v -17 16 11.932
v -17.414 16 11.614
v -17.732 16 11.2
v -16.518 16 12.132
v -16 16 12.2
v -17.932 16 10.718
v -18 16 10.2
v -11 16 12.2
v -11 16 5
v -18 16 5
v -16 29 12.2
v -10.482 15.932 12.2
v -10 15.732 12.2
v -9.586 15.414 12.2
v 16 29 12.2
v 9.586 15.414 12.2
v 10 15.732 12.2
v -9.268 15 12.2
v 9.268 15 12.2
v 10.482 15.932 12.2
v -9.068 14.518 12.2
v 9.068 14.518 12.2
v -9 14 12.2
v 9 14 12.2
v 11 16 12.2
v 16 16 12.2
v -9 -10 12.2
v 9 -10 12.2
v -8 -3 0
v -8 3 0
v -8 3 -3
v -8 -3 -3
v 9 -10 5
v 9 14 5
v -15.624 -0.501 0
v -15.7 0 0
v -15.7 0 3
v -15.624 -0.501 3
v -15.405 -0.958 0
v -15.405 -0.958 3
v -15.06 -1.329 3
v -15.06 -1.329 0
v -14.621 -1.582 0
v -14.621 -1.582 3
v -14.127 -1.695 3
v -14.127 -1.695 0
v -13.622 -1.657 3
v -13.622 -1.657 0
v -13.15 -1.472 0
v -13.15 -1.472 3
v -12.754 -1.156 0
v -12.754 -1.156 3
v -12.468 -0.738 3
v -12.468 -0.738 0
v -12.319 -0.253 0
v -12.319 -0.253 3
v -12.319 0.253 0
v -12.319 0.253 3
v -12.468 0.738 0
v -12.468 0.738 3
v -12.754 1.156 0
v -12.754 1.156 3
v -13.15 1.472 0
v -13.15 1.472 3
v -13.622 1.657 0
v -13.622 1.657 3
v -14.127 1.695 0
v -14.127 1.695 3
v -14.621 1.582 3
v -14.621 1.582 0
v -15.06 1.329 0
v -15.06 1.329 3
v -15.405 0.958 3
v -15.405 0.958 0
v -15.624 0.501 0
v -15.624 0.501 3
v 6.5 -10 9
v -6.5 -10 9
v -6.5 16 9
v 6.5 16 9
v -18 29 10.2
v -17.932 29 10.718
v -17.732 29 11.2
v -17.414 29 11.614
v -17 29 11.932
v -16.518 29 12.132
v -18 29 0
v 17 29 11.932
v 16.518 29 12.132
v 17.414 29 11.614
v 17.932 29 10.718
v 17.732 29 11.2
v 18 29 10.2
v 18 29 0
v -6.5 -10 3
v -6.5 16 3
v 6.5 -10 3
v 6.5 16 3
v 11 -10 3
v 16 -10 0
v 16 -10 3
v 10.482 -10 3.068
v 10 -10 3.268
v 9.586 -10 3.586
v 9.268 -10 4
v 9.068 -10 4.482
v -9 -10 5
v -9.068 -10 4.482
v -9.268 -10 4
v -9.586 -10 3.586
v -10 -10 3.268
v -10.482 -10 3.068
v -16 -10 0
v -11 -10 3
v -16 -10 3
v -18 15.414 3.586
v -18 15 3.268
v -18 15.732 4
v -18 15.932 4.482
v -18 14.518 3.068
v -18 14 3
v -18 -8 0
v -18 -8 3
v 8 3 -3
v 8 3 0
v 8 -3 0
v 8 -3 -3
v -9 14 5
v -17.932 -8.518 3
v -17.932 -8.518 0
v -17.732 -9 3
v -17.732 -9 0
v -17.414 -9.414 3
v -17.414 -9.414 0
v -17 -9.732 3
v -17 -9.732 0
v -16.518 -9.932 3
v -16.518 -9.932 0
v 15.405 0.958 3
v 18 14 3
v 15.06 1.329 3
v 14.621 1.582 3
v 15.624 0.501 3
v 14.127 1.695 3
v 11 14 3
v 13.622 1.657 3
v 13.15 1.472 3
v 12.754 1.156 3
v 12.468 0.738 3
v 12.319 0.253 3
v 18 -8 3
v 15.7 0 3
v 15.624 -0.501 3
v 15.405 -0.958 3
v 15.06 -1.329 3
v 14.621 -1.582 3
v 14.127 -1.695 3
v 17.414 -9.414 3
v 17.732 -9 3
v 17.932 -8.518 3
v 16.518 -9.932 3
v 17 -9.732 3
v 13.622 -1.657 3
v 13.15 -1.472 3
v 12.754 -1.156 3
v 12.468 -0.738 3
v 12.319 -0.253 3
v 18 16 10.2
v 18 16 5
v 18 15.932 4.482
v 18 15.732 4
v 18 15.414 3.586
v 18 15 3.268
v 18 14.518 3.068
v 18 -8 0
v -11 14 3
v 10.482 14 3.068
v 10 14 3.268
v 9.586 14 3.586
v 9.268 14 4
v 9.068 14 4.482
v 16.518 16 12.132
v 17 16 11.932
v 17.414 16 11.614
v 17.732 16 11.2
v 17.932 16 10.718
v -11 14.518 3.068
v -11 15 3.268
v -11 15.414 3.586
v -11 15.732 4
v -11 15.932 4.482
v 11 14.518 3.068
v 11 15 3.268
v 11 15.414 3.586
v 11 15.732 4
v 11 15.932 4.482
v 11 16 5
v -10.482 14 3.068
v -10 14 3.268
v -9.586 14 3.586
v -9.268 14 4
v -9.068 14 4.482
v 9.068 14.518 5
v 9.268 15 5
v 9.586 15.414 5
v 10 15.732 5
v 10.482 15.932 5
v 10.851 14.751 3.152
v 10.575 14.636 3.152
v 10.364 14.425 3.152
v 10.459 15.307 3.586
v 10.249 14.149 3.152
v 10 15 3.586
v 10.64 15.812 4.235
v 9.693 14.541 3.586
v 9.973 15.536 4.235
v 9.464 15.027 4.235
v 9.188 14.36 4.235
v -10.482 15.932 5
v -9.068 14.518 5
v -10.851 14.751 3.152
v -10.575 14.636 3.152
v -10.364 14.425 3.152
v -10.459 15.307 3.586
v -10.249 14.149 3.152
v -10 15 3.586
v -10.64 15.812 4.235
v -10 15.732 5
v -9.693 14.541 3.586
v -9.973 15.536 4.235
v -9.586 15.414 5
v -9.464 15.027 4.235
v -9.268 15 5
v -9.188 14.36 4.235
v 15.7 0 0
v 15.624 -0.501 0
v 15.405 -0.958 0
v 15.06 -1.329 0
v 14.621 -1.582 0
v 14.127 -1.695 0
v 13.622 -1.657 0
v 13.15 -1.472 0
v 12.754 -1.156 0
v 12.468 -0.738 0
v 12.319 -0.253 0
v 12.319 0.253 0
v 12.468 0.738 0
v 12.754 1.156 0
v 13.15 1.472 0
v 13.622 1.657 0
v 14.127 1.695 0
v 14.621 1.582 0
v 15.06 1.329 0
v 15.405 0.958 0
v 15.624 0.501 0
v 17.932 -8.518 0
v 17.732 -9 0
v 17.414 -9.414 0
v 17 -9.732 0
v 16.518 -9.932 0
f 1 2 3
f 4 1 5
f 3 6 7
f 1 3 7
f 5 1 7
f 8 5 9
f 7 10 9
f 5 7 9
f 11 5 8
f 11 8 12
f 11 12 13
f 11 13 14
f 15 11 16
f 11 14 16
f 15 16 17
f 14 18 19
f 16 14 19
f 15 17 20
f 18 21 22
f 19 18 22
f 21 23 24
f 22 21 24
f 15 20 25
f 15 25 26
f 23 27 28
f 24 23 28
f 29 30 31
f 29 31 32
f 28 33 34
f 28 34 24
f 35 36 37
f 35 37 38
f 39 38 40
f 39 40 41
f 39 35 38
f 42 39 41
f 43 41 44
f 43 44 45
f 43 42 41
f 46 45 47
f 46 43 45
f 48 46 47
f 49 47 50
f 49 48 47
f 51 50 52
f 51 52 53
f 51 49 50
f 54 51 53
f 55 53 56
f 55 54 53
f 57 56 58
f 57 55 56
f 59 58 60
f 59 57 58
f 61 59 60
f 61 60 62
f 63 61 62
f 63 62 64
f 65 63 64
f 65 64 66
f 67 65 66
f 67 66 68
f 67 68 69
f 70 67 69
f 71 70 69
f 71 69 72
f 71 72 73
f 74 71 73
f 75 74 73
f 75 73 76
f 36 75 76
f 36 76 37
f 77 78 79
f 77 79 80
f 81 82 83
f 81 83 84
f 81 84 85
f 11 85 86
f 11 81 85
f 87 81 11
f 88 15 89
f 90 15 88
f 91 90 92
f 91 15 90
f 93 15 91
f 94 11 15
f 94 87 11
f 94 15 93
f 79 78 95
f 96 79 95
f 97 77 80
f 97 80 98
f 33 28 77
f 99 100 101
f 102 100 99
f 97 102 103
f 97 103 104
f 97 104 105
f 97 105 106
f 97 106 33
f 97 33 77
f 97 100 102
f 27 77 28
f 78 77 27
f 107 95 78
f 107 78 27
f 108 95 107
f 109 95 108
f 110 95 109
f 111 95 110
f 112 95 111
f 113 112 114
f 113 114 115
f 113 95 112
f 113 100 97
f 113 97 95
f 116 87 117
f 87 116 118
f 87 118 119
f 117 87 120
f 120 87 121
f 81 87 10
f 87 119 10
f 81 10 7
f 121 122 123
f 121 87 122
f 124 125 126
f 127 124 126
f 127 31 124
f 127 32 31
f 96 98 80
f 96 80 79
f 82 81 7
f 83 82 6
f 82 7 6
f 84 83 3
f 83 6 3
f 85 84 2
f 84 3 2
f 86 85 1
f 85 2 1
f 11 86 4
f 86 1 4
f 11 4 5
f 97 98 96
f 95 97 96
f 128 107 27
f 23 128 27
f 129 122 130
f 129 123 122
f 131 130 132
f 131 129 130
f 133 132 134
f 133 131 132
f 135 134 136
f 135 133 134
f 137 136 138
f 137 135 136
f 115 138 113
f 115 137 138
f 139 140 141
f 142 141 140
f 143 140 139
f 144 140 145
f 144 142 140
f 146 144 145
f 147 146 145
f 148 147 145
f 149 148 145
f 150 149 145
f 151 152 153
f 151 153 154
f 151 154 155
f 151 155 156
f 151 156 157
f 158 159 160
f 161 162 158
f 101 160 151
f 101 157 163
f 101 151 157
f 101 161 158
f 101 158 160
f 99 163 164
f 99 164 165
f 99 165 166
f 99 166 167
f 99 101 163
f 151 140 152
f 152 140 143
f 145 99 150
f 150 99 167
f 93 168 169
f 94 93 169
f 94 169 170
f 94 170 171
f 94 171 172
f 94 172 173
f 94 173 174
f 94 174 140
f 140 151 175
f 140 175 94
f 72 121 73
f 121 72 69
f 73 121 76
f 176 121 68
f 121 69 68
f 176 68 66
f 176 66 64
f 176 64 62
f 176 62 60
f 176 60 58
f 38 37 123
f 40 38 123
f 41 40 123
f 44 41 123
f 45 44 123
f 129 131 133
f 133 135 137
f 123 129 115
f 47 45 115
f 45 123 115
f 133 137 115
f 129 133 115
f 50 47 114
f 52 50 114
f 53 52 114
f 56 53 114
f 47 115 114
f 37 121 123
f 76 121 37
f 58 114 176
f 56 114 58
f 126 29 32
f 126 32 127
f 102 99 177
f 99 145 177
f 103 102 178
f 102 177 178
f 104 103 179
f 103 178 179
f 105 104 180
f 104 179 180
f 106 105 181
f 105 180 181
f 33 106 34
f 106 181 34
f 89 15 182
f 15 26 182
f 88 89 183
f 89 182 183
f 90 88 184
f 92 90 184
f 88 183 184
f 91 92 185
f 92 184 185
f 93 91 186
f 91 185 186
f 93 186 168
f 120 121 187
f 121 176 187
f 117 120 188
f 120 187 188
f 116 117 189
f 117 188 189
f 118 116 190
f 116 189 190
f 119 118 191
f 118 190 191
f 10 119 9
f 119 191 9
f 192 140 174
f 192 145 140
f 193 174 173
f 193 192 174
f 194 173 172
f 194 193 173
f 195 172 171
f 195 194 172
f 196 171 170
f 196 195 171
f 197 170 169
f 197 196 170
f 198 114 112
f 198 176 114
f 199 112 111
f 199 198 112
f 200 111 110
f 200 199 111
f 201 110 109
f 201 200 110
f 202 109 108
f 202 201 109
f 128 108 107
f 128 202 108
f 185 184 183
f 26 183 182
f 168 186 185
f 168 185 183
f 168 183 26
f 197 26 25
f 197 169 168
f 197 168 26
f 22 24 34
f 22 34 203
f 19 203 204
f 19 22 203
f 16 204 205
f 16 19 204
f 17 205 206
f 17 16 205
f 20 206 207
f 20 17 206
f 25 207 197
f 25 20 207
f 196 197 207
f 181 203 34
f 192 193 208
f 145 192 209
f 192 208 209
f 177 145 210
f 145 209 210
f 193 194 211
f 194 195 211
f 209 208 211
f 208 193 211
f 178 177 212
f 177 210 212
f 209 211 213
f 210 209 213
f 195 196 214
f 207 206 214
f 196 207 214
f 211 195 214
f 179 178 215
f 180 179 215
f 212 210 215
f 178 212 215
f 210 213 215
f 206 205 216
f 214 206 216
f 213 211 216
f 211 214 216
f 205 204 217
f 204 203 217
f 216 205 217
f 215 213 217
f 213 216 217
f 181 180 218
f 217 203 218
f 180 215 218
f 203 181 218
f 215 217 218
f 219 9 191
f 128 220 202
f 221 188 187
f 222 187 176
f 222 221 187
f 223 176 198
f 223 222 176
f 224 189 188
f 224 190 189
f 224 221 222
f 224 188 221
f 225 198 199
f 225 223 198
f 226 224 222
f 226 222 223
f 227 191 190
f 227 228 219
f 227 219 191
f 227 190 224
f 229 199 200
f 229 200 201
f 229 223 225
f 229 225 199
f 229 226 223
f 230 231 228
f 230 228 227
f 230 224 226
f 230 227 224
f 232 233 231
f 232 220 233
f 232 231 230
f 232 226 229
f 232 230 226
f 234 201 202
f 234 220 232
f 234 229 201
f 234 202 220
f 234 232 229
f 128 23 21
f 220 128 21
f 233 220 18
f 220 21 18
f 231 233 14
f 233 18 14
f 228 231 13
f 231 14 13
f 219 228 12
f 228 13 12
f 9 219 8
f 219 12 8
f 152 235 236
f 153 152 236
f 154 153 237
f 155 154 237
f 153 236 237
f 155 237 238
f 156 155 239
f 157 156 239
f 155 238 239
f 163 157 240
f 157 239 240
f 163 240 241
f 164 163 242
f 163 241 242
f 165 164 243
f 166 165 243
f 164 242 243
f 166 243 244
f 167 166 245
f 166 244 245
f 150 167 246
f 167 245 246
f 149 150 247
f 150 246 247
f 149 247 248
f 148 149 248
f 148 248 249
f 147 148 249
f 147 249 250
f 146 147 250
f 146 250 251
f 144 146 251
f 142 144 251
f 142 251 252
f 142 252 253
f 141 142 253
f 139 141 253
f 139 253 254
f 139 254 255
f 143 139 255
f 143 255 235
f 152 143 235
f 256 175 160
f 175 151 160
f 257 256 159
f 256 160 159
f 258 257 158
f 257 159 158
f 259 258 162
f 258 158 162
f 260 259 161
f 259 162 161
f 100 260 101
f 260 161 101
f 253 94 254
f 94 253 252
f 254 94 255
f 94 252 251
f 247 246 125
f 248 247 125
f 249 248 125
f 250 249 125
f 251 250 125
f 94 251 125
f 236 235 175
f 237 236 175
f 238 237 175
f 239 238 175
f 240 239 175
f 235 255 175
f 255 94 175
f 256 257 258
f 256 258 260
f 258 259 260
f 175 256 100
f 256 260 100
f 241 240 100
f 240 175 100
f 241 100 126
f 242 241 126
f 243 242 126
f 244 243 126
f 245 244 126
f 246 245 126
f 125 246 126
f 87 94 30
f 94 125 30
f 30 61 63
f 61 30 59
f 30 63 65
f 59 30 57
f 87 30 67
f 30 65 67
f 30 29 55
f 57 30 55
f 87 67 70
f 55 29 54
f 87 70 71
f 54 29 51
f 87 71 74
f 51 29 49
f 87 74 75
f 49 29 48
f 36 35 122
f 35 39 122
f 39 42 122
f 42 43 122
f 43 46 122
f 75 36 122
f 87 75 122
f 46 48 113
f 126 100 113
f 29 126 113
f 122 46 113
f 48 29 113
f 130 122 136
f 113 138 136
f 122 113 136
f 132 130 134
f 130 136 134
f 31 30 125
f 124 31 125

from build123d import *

# Parameters (mm, degrees)
SKIZZE1_W                       = 18
SKIZZE1_H                       = 10
AUFSATZ_LINEAR_AUSTRAGEN1_DEPTH = 3
DURCHGANGSLOCH_F_R_M31_D        = 3.4
SKIZZE5_W                       = 8
SKIZZE5_H                       = 3
AUFSATZ_LINEAR_AUSTRAGEN2_DEPTH = 3
AUFSATZ_LINEAR_AUSTRAGEN3_DEPTH = 10
AUFSATZ_LINEAR_AUSTRAGEN7_DEPTH = 9
SKIZZE19_W                      = 18
SKIZZE19_H                      = 3
AUFSATZ_LINEAR_AUSTRAGEN8_DEPTH = 9.2
VERRUNDUNG1_R                   = 2
VERRUNDUNG3_R                   = 2
AUFSATZ_LINEAR_AUSTRAGEN9_DEPTH = 10


with BuildPart() as part:
    # Skizze1 → Aufsatz-Linear austragen1 (new body)
    with BuildSketch(Plane.XY):
        with Locations((-9, 5)):
            Rectangle(SKIZZE1_W, SKIZZE1_H)
    extrude(amount=AUFSATZ_LINEAR_AUSTRAGEN1_DEPTH)

    # Durchgangsloch für M31 (through all)
    with Locations(Plane.XY.offset(3)):
        with Locations((-14, 0)):
            Hole(DURCHGANGSLOCH_F_R_M31_D / 2)

    # Skizze5 → Aufsatz-Linear austragen2 (add)
    with BuildSketch(Plane(origin=(0, 0, 0), x_dir=(-1, 0, 0), z_dir=(0, 0, -1))):
        with Locations((4, 1.5)):
            Rectangle(SKIZZE5_W, SKIZZE5_H)
    extrude(amount=AUFSATZ_LINEAR_AUSTRAGEN2_DEPTH)

    # Skizze7 → Aufsatz-Linear austragen3 (add)
    with BuildSketch(Plane(origin=(0, 10, 0), x_dir=(1, 0, 0), z_dir=(0, 1, 0))):
        Polygon((-6.5, -3), (-6.5, -9), (0, -9), (0, -12.2), (-9, -12.2), (-9, -3), align=None)
    extrude(amount=-AUFSATZ_LINEAR_AUSTRAGEN3_DEPTH)

    # Spiegeln2: part across plane


with BuildPart() as part_1:
    add(part.part)
    add(part.part.mirror(Plane(origin=(0, 0, 3), x_dir=(0, 0, 1), z_dir=(0, 1, 0))))

    # Skizze16 → Aufsatz-Linear austragen7 (add)
    with BuildSketch(Plane(origin=(0, 10, 0), x_dir=(1, 0, 0), z_dir=(0, 1, 0))):
        Polygon((0, 0), (-18, 0), (-18, -3), (-9, -3), (-9, -12.2), (0, -12.2), (0, -9), (-6.5, -9), (-6.5, -3), (0, -3), align=None)
    extrude(amount=AUFSATZ_LINEAR_AUSTRAGEN7_DEPTH)

    # Skizze19 → Aufsatz-Linear austragen8 (add)
    with BuildSketch(Plane.XY.offset(3)):
        with Locations((-9, 17.5)):
            Rectangle(SKIZZE19_W, SKIZZE19_H)
    extrude(amount=AUFSATZ_LINEAR_AUSTRAGEN8_DEPTH)

    # Verrundung1
    verrundung1_edges = [part_1.edges().sort_by_distance(p)[0] for p in [
        (-9, 16, 7.6),
        (-13.5, 16, 3),
        (-18, 17.5, 12.2),
        (-9, 5, 3),
    ]]
    fillet(verrundung1_edges, radius=VERRUNDUNG1_R)

    # Verrundung3
    verrundung3_edges = [part_1.edges().sort_by_distance(p)[0] for p in [
        (-18, -10, 1.5),
    ]]
    fillet(verrundung3_edges, radius=VERRUNDUNG3_R)

    # Spiegeln1: part across plane


with BuildPart() as part_2:
    add(part_1.part)
    add(part_1.part.mirror(Plane(origin=(0, 0, 3), x_dir=(0, 0, 1), z_dir=(-1, 0, 0))))

    # Skizze20 → Aufsatz-Linear austragen9 (add)
    with BuildSketch(Plane(origin=(0, 19, 0), x_dir=(1, 0, 0), z_dir=(0, 1, 0))):
        with BuildLine():
            Line((-18, 0), (-18, -10.2))
            ThreePointArc((-18, -10.2), (-17.414213562, -11.614213562), (-16, -12.2))
            Line((-16, -12.2), (16, -12.2))
            ThreePointArc((16, -12.2), (17.414213562, -11.614213562), (18, -10.2))
            Line((18, -10.2), (18, 0))
            Line((18, 0), (-18, 0))
        make_face()
    extrude(amount=AUFSATZ_LINEAR_AUSTRAGEN9_DEPTH)


solid = part_2.part
